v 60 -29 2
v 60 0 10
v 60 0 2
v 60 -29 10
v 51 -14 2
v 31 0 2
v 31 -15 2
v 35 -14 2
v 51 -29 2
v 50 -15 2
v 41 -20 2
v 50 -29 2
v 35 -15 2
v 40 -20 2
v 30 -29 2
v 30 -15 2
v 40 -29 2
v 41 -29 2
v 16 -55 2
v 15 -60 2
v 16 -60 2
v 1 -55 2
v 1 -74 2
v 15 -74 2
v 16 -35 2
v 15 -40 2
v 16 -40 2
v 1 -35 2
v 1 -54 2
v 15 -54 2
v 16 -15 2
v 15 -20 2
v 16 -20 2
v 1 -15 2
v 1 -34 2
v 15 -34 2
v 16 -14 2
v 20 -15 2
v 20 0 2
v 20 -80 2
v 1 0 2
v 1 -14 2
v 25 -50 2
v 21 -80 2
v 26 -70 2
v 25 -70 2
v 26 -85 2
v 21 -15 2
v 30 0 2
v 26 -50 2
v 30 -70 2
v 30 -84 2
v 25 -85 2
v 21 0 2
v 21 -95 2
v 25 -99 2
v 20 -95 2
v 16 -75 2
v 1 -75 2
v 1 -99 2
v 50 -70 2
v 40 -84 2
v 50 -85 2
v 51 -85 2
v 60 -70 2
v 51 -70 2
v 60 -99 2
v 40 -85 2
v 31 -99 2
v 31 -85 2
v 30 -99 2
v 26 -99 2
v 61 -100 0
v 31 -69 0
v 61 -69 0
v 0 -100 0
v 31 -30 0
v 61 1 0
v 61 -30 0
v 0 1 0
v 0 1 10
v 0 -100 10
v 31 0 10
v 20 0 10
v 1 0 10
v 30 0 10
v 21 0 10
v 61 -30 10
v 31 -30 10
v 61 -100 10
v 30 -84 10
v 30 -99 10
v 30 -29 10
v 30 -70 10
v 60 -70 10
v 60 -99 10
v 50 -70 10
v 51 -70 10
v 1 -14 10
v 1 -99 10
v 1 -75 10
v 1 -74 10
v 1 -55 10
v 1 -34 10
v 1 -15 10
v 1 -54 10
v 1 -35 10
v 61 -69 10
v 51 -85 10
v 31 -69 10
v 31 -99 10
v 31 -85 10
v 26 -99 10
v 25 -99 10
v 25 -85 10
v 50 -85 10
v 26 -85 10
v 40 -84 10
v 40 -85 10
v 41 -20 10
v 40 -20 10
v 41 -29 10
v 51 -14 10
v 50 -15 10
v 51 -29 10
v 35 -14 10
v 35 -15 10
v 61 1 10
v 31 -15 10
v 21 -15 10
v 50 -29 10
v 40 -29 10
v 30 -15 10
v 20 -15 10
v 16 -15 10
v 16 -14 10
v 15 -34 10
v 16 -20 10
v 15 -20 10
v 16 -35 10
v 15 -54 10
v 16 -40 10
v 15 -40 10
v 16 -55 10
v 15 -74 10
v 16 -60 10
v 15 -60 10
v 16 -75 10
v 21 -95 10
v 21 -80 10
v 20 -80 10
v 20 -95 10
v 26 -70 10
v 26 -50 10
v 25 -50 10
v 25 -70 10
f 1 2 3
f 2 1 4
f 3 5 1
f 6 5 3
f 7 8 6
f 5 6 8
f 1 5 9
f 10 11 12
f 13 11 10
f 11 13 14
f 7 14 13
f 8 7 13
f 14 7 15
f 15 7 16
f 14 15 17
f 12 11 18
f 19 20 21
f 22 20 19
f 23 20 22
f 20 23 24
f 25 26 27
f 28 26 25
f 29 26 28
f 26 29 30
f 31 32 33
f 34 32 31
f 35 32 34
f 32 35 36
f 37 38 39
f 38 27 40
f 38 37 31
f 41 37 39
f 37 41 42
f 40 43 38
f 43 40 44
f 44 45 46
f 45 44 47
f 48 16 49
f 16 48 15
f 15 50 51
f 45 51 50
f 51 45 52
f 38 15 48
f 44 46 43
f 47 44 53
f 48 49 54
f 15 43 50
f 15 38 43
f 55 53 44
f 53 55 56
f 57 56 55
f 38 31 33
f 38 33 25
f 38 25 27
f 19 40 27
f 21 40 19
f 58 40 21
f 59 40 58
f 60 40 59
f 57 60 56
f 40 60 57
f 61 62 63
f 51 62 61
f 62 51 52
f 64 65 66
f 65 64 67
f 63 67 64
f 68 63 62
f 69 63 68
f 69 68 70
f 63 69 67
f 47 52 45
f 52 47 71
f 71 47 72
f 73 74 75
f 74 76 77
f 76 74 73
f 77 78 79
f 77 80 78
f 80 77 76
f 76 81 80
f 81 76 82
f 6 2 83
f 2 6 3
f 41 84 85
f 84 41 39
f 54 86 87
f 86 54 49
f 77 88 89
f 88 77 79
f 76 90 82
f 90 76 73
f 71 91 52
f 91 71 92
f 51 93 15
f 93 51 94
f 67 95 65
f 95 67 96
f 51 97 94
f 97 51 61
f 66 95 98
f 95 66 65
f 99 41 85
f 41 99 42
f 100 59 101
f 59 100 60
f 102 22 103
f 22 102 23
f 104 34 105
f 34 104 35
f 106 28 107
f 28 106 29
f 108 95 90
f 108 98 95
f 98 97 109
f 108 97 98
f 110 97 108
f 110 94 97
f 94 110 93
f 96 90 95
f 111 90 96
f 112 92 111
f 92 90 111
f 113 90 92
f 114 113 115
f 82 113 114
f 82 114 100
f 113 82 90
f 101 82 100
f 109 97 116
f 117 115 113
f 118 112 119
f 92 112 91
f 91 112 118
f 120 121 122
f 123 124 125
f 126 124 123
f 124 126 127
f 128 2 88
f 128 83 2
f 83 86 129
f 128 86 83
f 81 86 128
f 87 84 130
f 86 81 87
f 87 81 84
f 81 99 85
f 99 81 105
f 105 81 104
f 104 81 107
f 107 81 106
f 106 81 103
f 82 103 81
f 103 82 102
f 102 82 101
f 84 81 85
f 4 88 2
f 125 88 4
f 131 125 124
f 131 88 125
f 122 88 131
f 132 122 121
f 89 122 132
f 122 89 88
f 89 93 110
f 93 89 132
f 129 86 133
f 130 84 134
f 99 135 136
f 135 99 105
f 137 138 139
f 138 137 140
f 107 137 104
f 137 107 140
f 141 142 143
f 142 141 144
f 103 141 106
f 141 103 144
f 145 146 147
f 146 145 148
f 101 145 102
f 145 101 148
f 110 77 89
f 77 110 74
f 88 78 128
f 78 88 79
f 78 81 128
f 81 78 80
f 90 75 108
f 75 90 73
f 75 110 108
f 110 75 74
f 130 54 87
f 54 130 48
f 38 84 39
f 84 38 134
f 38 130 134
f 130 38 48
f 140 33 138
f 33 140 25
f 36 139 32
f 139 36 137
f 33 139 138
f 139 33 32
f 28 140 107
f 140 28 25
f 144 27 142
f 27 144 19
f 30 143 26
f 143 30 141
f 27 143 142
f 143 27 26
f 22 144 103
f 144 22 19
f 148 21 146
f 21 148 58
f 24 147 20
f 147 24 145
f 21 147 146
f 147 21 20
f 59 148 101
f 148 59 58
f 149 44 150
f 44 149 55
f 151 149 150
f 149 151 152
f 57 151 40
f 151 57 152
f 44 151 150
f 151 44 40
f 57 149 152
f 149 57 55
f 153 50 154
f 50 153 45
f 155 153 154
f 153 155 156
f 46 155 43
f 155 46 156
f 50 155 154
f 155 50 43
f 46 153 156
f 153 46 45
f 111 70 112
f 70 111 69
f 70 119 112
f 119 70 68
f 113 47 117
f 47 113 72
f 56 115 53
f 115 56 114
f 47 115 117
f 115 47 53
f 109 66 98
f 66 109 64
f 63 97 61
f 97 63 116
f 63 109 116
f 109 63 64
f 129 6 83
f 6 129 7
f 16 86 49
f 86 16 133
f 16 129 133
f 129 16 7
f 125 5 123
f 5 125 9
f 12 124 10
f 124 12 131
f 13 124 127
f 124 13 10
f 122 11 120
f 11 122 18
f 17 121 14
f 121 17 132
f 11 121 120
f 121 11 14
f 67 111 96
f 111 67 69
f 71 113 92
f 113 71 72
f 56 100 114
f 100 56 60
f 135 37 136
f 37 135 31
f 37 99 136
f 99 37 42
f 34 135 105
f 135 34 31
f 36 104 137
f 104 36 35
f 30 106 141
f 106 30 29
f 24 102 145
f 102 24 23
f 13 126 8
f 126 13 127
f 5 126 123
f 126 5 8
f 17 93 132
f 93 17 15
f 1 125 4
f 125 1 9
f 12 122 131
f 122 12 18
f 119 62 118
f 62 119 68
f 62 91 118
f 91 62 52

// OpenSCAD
//2 этаж

{translate([0,-30,0])
cube([60,30,2]);
translate([0,0,0])
rotate([0,0,270])
cube([100,30,2]);
translate([0,-100,0])
cube([60,30,2]);
}
{
translate([0,-100,0])
cube([1,100,10]);
translate([30,-70,0])
cube([1,40,10]);
translate([60,-30,0])
cube([1,31,10]);
translate([60,-100,0])
cube([1,31,10]);
translate([20,-15,0])
cube([1,15,10]);
translate([15,-35,0])
cube([1,15,10]);
translate([15,-55,0])
cube([1,15,10]);
translate([15,-75,0])
cube([1,15,10]);
translate([20,-95,0])
cube([1,15,10]);
translate([25,-70,0])
cube([1,20,10]);
translate([30,-100,0])
cube([1,15,10]);
translate([25,-100,0])
cube([1,15,10]);
translate([50,-85,0])
cube([1,15,10]);
translate([30,-15,0])
cube([1,15,10]);
translate([50,-30,0])
cube([1,15,10]);
translate([40,-30,0])
cube([1,10,10]);
}
{
translate([0,0,0])
cube([60,1,10]);
translate([0,-100,0])
cube([60,1,10]);
translate([0,-15,0])
cube([16,1,10]);
translate([0,-35,0])
cube([16,1,10]);
translate([0,-55,0])
cube([16,1,10]);
translate([0,-75,0])
cube([16,1,10]);
translate([35,-15,0])
cube([16,1,10]);
translate([30,-30,0])
cube([30,1,10]);
translate([30,-70,0])
cube([30,1,10]);
translate([30,-85,0])
cube([10,1,10]);



}
